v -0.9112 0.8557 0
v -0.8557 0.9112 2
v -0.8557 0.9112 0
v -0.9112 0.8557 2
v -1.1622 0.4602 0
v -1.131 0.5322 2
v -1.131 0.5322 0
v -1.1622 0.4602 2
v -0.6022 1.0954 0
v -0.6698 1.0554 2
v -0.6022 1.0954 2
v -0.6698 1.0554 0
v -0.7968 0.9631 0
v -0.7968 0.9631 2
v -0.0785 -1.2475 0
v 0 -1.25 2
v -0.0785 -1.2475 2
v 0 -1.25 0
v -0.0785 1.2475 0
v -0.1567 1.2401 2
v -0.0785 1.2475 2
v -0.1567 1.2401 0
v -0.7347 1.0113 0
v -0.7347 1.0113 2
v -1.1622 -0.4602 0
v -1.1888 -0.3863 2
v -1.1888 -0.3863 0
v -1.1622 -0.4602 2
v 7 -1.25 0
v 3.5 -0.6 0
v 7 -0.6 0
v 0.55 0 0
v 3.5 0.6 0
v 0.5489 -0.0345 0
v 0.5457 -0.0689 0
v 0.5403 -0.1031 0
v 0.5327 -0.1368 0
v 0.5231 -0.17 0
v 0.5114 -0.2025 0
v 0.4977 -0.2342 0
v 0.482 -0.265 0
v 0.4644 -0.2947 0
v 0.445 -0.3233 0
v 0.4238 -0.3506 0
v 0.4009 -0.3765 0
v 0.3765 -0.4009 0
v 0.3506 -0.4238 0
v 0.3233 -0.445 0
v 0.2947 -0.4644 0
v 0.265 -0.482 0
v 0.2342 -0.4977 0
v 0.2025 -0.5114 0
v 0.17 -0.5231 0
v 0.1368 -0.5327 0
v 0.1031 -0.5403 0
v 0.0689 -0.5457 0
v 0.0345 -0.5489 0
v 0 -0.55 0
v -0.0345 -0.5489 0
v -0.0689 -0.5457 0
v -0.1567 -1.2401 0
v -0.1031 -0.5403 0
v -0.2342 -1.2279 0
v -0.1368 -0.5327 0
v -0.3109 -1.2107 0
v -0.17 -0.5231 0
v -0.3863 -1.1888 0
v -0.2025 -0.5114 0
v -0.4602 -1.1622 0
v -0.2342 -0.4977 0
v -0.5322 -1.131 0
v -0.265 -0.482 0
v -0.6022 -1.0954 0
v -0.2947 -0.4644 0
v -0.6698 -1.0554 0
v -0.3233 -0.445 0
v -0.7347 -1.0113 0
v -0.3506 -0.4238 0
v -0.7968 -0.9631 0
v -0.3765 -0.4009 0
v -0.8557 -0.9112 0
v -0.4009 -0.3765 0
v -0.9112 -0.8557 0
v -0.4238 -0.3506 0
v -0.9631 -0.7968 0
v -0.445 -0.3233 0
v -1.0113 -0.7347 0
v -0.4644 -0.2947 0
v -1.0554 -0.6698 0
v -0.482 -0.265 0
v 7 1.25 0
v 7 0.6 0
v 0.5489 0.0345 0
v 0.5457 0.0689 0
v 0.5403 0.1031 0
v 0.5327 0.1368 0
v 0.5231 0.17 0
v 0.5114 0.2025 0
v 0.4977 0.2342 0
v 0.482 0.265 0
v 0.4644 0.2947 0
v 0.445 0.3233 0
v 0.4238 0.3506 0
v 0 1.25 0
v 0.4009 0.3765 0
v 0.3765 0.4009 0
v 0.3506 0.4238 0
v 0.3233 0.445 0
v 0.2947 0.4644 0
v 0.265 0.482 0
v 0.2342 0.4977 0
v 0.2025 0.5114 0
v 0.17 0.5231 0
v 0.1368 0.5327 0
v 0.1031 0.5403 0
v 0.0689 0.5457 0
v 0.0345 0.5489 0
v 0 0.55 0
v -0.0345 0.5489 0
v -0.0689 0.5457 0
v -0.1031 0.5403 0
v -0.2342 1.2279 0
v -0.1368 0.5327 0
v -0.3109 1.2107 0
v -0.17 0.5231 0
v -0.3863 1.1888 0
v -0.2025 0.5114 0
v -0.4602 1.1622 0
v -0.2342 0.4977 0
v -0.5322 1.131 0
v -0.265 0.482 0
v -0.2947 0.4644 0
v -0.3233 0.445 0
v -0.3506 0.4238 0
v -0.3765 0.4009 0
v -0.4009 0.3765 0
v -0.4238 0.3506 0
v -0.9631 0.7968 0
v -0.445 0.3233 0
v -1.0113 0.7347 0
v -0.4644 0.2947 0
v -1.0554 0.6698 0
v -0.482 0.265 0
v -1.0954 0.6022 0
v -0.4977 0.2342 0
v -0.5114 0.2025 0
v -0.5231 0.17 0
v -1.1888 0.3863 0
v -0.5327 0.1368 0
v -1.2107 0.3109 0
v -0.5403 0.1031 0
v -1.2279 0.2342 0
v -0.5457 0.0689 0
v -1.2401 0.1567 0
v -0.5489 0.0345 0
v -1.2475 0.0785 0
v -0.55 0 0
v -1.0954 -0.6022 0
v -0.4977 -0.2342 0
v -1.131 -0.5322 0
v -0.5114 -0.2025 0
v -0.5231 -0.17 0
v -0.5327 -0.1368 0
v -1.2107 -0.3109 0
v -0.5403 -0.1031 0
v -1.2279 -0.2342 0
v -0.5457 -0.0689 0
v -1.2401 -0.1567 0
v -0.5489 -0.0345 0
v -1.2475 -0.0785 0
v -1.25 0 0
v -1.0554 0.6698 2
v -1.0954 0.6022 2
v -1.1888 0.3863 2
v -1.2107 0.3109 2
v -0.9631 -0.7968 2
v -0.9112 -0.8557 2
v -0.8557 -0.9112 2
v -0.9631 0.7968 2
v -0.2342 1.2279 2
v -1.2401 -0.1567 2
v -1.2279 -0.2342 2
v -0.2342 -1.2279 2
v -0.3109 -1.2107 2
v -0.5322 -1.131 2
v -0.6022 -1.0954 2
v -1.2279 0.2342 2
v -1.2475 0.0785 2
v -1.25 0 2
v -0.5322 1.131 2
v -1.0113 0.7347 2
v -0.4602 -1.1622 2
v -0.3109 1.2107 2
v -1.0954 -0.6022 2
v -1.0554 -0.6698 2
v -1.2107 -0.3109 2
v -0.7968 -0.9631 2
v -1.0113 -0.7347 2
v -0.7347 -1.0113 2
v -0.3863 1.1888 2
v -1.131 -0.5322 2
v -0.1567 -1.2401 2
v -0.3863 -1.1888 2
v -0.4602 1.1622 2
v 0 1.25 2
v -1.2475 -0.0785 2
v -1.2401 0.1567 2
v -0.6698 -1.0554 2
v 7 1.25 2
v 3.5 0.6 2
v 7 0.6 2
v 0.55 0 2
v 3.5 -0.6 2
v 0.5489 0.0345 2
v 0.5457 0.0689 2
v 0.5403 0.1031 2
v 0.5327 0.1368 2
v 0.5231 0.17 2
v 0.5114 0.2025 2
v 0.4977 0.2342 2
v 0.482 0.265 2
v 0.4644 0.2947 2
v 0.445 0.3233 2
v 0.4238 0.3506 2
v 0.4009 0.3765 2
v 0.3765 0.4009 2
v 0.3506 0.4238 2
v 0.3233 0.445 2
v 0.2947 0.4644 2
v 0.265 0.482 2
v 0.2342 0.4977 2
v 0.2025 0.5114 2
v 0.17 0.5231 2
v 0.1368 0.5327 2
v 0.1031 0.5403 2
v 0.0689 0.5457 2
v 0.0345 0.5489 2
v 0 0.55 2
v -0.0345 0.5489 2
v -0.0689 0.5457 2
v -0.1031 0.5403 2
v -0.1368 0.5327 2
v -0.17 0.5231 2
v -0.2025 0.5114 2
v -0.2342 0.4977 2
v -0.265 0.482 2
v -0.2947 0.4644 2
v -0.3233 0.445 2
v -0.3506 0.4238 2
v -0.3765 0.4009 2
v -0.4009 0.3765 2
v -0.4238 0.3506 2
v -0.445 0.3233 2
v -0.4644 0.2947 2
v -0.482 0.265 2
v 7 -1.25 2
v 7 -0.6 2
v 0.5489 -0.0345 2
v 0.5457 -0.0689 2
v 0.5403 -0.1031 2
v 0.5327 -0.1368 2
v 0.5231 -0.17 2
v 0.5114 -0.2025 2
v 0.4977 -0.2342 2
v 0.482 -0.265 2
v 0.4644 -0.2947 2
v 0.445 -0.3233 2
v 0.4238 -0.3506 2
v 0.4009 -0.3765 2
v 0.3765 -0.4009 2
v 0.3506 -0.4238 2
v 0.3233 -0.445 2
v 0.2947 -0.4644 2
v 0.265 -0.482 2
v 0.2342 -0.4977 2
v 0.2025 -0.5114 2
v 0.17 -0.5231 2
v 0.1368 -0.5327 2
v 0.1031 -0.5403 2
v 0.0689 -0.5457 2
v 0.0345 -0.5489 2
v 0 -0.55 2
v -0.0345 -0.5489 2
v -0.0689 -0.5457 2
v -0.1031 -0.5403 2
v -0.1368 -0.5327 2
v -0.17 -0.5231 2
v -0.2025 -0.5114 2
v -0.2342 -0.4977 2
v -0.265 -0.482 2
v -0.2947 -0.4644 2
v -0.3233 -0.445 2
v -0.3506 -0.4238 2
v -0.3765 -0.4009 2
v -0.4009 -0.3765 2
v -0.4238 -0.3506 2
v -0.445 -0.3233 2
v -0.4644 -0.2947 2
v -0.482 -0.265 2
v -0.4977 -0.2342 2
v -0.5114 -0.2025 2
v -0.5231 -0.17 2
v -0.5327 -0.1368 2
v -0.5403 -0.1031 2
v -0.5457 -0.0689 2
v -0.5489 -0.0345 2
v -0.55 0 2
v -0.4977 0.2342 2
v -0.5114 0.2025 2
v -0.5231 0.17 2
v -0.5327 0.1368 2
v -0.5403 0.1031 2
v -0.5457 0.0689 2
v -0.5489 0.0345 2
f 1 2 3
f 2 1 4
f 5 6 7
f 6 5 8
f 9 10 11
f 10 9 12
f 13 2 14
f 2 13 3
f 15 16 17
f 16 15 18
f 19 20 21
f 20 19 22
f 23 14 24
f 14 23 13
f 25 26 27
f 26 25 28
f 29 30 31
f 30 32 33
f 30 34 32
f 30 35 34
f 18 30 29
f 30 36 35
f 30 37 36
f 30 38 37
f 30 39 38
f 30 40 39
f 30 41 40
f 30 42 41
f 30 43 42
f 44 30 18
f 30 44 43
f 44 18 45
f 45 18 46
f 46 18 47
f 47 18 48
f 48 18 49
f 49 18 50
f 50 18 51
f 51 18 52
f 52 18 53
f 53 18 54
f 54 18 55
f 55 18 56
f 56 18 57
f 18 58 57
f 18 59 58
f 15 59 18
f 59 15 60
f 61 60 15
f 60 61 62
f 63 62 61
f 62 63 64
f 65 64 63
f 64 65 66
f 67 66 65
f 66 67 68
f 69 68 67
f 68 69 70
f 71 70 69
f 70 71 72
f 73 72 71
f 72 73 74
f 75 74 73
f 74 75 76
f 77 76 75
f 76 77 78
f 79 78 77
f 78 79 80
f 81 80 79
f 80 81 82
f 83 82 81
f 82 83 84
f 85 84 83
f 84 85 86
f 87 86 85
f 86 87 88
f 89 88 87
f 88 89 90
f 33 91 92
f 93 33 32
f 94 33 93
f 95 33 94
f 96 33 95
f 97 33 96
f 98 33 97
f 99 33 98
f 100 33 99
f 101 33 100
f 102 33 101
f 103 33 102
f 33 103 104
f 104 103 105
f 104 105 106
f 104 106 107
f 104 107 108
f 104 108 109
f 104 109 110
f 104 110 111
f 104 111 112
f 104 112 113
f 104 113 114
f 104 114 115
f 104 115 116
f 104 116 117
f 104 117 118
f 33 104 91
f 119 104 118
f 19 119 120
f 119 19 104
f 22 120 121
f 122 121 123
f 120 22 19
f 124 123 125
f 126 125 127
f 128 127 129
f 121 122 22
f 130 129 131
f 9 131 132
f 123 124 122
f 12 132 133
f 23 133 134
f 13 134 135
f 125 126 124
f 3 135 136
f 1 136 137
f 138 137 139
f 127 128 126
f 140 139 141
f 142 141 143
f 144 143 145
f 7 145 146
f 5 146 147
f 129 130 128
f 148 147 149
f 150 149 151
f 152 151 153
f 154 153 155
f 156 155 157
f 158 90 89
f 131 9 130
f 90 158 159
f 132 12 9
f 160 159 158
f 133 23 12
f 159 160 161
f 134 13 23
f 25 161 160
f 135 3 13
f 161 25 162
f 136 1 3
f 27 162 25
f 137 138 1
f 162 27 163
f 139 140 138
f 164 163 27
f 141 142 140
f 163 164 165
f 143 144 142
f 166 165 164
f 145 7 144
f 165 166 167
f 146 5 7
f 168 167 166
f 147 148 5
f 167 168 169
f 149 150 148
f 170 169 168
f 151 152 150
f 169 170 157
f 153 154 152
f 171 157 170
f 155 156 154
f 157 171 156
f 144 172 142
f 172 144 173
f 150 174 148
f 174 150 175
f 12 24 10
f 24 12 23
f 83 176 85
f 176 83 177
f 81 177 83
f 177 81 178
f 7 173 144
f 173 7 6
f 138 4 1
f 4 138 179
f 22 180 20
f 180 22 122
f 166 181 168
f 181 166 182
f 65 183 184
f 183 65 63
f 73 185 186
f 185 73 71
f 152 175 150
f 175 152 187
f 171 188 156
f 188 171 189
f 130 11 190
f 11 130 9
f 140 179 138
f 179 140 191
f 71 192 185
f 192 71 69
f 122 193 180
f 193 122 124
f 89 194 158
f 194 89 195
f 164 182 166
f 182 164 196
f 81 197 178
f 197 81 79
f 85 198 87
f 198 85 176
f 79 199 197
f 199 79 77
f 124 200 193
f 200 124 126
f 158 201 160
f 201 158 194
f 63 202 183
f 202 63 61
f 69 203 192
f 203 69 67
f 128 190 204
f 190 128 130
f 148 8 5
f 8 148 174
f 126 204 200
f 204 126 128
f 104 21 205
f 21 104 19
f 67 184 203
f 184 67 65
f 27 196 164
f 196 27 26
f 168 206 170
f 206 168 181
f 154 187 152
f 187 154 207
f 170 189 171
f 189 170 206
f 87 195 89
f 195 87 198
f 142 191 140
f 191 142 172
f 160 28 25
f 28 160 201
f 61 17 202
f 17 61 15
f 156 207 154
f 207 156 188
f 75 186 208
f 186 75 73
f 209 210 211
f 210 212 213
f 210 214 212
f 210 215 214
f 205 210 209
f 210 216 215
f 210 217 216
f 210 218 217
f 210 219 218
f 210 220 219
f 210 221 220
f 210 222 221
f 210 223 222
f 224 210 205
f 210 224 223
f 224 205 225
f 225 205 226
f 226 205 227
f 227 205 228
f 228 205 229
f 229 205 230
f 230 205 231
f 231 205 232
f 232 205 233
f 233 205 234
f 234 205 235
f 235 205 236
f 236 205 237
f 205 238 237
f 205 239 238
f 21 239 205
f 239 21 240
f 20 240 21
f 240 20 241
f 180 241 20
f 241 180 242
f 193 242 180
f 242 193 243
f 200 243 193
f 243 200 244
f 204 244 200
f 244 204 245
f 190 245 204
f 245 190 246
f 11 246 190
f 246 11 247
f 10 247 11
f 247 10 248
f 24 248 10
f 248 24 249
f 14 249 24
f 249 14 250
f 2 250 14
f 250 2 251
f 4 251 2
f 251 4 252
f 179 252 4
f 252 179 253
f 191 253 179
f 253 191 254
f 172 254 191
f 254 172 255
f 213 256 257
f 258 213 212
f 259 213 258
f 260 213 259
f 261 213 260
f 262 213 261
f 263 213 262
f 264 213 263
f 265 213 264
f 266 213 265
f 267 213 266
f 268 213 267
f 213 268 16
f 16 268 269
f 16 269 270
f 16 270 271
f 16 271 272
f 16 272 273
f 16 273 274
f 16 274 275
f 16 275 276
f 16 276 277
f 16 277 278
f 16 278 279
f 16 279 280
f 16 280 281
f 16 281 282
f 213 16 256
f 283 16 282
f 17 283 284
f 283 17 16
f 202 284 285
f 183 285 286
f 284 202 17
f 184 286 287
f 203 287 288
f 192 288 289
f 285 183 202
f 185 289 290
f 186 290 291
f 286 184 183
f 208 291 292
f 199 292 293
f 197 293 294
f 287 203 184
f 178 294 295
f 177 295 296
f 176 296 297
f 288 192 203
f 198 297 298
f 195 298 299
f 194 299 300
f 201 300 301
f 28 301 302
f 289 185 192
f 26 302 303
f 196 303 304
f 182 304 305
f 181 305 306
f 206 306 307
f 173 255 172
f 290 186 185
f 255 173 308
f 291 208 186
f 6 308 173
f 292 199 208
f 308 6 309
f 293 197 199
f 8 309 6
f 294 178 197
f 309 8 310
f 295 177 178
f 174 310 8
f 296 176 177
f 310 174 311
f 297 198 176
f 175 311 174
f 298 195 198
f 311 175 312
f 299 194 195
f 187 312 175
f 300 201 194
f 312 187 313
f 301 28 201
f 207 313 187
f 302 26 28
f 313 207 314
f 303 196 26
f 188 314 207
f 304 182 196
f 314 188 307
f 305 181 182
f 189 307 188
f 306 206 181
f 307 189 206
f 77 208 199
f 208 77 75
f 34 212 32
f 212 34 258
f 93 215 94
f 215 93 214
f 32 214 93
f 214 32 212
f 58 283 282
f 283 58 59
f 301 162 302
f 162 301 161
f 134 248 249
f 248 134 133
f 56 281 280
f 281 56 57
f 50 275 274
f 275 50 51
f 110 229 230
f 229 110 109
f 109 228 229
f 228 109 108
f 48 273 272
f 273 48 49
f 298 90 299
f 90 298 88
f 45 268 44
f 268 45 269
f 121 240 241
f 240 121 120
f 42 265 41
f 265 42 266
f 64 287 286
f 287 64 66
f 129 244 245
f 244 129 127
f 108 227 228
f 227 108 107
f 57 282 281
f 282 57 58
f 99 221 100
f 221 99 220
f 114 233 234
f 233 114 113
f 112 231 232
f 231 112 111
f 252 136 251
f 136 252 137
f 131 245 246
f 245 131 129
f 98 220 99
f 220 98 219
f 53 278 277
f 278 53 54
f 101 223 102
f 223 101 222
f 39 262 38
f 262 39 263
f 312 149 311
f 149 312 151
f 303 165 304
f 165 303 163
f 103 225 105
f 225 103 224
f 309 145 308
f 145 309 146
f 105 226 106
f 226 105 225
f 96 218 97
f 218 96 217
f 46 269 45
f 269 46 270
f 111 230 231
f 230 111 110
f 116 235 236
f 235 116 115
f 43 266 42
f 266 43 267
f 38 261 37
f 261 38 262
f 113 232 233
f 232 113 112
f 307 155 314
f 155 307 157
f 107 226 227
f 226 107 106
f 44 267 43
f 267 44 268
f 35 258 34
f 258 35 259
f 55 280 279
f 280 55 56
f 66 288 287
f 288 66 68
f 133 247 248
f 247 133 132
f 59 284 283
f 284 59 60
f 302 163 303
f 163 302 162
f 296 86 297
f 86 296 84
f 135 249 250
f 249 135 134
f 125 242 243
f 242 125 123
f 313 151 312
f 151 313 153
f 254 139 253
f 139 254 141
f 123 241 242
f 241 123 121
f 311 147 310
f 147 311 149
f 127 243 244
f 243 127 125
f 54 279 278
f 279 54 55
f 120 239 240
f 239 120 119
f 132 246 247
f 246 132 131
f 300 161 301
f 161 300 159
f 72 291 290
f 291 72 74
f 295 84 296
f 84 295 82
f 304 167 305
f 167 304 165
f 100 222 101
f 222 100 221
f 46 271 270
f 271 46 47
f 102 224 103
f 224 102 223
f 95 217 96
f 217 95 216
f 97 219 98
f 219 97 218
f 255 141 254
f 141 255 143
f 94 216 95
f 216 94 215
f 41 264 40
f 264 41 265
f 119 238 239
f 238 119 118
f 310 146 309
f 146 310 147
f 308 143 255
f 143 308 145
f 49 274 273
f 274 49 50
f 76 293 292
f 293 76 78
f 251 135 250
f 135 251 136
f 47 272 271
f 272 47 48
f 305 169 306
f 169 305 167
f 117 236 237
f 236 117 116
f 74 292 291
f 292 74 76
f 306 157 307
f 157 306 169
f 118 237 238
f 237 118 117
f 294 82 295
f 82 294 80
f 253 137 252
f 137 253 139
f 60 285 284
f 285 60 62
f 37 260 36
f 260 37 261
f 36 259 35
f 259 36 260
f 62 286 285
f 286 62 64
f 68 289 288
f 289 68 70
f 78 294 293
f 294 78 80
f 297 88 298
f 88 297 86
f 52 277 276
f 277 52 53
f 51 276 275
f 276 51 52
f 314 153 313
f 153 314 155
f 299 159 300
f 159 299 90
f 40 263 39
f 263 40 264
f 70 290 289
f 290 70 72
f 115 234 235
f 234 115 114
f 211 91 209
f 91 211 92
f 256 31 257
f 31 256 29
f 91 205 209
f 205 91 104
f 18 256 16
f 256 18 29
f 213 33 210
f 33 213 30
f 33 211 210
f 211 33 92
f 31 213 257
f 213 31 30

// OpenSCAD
$fn=100;

steelDia = 1.1;
width = 2.5;
innerWidth = 1.2;

difference() {
    cylinder(d=width, h=2);
    cylinder(d=steelDia, h=2);
}
difference() {
    union() {
        translate([0,-width/2,0]) {
            cube([7,width,2]);
        }
    }
    cylinder(d=steelDia, h=2);
    translate([3.5,-innerWidth/2,0]) {
        cube([4,innerWidth,2]);
    }
}
